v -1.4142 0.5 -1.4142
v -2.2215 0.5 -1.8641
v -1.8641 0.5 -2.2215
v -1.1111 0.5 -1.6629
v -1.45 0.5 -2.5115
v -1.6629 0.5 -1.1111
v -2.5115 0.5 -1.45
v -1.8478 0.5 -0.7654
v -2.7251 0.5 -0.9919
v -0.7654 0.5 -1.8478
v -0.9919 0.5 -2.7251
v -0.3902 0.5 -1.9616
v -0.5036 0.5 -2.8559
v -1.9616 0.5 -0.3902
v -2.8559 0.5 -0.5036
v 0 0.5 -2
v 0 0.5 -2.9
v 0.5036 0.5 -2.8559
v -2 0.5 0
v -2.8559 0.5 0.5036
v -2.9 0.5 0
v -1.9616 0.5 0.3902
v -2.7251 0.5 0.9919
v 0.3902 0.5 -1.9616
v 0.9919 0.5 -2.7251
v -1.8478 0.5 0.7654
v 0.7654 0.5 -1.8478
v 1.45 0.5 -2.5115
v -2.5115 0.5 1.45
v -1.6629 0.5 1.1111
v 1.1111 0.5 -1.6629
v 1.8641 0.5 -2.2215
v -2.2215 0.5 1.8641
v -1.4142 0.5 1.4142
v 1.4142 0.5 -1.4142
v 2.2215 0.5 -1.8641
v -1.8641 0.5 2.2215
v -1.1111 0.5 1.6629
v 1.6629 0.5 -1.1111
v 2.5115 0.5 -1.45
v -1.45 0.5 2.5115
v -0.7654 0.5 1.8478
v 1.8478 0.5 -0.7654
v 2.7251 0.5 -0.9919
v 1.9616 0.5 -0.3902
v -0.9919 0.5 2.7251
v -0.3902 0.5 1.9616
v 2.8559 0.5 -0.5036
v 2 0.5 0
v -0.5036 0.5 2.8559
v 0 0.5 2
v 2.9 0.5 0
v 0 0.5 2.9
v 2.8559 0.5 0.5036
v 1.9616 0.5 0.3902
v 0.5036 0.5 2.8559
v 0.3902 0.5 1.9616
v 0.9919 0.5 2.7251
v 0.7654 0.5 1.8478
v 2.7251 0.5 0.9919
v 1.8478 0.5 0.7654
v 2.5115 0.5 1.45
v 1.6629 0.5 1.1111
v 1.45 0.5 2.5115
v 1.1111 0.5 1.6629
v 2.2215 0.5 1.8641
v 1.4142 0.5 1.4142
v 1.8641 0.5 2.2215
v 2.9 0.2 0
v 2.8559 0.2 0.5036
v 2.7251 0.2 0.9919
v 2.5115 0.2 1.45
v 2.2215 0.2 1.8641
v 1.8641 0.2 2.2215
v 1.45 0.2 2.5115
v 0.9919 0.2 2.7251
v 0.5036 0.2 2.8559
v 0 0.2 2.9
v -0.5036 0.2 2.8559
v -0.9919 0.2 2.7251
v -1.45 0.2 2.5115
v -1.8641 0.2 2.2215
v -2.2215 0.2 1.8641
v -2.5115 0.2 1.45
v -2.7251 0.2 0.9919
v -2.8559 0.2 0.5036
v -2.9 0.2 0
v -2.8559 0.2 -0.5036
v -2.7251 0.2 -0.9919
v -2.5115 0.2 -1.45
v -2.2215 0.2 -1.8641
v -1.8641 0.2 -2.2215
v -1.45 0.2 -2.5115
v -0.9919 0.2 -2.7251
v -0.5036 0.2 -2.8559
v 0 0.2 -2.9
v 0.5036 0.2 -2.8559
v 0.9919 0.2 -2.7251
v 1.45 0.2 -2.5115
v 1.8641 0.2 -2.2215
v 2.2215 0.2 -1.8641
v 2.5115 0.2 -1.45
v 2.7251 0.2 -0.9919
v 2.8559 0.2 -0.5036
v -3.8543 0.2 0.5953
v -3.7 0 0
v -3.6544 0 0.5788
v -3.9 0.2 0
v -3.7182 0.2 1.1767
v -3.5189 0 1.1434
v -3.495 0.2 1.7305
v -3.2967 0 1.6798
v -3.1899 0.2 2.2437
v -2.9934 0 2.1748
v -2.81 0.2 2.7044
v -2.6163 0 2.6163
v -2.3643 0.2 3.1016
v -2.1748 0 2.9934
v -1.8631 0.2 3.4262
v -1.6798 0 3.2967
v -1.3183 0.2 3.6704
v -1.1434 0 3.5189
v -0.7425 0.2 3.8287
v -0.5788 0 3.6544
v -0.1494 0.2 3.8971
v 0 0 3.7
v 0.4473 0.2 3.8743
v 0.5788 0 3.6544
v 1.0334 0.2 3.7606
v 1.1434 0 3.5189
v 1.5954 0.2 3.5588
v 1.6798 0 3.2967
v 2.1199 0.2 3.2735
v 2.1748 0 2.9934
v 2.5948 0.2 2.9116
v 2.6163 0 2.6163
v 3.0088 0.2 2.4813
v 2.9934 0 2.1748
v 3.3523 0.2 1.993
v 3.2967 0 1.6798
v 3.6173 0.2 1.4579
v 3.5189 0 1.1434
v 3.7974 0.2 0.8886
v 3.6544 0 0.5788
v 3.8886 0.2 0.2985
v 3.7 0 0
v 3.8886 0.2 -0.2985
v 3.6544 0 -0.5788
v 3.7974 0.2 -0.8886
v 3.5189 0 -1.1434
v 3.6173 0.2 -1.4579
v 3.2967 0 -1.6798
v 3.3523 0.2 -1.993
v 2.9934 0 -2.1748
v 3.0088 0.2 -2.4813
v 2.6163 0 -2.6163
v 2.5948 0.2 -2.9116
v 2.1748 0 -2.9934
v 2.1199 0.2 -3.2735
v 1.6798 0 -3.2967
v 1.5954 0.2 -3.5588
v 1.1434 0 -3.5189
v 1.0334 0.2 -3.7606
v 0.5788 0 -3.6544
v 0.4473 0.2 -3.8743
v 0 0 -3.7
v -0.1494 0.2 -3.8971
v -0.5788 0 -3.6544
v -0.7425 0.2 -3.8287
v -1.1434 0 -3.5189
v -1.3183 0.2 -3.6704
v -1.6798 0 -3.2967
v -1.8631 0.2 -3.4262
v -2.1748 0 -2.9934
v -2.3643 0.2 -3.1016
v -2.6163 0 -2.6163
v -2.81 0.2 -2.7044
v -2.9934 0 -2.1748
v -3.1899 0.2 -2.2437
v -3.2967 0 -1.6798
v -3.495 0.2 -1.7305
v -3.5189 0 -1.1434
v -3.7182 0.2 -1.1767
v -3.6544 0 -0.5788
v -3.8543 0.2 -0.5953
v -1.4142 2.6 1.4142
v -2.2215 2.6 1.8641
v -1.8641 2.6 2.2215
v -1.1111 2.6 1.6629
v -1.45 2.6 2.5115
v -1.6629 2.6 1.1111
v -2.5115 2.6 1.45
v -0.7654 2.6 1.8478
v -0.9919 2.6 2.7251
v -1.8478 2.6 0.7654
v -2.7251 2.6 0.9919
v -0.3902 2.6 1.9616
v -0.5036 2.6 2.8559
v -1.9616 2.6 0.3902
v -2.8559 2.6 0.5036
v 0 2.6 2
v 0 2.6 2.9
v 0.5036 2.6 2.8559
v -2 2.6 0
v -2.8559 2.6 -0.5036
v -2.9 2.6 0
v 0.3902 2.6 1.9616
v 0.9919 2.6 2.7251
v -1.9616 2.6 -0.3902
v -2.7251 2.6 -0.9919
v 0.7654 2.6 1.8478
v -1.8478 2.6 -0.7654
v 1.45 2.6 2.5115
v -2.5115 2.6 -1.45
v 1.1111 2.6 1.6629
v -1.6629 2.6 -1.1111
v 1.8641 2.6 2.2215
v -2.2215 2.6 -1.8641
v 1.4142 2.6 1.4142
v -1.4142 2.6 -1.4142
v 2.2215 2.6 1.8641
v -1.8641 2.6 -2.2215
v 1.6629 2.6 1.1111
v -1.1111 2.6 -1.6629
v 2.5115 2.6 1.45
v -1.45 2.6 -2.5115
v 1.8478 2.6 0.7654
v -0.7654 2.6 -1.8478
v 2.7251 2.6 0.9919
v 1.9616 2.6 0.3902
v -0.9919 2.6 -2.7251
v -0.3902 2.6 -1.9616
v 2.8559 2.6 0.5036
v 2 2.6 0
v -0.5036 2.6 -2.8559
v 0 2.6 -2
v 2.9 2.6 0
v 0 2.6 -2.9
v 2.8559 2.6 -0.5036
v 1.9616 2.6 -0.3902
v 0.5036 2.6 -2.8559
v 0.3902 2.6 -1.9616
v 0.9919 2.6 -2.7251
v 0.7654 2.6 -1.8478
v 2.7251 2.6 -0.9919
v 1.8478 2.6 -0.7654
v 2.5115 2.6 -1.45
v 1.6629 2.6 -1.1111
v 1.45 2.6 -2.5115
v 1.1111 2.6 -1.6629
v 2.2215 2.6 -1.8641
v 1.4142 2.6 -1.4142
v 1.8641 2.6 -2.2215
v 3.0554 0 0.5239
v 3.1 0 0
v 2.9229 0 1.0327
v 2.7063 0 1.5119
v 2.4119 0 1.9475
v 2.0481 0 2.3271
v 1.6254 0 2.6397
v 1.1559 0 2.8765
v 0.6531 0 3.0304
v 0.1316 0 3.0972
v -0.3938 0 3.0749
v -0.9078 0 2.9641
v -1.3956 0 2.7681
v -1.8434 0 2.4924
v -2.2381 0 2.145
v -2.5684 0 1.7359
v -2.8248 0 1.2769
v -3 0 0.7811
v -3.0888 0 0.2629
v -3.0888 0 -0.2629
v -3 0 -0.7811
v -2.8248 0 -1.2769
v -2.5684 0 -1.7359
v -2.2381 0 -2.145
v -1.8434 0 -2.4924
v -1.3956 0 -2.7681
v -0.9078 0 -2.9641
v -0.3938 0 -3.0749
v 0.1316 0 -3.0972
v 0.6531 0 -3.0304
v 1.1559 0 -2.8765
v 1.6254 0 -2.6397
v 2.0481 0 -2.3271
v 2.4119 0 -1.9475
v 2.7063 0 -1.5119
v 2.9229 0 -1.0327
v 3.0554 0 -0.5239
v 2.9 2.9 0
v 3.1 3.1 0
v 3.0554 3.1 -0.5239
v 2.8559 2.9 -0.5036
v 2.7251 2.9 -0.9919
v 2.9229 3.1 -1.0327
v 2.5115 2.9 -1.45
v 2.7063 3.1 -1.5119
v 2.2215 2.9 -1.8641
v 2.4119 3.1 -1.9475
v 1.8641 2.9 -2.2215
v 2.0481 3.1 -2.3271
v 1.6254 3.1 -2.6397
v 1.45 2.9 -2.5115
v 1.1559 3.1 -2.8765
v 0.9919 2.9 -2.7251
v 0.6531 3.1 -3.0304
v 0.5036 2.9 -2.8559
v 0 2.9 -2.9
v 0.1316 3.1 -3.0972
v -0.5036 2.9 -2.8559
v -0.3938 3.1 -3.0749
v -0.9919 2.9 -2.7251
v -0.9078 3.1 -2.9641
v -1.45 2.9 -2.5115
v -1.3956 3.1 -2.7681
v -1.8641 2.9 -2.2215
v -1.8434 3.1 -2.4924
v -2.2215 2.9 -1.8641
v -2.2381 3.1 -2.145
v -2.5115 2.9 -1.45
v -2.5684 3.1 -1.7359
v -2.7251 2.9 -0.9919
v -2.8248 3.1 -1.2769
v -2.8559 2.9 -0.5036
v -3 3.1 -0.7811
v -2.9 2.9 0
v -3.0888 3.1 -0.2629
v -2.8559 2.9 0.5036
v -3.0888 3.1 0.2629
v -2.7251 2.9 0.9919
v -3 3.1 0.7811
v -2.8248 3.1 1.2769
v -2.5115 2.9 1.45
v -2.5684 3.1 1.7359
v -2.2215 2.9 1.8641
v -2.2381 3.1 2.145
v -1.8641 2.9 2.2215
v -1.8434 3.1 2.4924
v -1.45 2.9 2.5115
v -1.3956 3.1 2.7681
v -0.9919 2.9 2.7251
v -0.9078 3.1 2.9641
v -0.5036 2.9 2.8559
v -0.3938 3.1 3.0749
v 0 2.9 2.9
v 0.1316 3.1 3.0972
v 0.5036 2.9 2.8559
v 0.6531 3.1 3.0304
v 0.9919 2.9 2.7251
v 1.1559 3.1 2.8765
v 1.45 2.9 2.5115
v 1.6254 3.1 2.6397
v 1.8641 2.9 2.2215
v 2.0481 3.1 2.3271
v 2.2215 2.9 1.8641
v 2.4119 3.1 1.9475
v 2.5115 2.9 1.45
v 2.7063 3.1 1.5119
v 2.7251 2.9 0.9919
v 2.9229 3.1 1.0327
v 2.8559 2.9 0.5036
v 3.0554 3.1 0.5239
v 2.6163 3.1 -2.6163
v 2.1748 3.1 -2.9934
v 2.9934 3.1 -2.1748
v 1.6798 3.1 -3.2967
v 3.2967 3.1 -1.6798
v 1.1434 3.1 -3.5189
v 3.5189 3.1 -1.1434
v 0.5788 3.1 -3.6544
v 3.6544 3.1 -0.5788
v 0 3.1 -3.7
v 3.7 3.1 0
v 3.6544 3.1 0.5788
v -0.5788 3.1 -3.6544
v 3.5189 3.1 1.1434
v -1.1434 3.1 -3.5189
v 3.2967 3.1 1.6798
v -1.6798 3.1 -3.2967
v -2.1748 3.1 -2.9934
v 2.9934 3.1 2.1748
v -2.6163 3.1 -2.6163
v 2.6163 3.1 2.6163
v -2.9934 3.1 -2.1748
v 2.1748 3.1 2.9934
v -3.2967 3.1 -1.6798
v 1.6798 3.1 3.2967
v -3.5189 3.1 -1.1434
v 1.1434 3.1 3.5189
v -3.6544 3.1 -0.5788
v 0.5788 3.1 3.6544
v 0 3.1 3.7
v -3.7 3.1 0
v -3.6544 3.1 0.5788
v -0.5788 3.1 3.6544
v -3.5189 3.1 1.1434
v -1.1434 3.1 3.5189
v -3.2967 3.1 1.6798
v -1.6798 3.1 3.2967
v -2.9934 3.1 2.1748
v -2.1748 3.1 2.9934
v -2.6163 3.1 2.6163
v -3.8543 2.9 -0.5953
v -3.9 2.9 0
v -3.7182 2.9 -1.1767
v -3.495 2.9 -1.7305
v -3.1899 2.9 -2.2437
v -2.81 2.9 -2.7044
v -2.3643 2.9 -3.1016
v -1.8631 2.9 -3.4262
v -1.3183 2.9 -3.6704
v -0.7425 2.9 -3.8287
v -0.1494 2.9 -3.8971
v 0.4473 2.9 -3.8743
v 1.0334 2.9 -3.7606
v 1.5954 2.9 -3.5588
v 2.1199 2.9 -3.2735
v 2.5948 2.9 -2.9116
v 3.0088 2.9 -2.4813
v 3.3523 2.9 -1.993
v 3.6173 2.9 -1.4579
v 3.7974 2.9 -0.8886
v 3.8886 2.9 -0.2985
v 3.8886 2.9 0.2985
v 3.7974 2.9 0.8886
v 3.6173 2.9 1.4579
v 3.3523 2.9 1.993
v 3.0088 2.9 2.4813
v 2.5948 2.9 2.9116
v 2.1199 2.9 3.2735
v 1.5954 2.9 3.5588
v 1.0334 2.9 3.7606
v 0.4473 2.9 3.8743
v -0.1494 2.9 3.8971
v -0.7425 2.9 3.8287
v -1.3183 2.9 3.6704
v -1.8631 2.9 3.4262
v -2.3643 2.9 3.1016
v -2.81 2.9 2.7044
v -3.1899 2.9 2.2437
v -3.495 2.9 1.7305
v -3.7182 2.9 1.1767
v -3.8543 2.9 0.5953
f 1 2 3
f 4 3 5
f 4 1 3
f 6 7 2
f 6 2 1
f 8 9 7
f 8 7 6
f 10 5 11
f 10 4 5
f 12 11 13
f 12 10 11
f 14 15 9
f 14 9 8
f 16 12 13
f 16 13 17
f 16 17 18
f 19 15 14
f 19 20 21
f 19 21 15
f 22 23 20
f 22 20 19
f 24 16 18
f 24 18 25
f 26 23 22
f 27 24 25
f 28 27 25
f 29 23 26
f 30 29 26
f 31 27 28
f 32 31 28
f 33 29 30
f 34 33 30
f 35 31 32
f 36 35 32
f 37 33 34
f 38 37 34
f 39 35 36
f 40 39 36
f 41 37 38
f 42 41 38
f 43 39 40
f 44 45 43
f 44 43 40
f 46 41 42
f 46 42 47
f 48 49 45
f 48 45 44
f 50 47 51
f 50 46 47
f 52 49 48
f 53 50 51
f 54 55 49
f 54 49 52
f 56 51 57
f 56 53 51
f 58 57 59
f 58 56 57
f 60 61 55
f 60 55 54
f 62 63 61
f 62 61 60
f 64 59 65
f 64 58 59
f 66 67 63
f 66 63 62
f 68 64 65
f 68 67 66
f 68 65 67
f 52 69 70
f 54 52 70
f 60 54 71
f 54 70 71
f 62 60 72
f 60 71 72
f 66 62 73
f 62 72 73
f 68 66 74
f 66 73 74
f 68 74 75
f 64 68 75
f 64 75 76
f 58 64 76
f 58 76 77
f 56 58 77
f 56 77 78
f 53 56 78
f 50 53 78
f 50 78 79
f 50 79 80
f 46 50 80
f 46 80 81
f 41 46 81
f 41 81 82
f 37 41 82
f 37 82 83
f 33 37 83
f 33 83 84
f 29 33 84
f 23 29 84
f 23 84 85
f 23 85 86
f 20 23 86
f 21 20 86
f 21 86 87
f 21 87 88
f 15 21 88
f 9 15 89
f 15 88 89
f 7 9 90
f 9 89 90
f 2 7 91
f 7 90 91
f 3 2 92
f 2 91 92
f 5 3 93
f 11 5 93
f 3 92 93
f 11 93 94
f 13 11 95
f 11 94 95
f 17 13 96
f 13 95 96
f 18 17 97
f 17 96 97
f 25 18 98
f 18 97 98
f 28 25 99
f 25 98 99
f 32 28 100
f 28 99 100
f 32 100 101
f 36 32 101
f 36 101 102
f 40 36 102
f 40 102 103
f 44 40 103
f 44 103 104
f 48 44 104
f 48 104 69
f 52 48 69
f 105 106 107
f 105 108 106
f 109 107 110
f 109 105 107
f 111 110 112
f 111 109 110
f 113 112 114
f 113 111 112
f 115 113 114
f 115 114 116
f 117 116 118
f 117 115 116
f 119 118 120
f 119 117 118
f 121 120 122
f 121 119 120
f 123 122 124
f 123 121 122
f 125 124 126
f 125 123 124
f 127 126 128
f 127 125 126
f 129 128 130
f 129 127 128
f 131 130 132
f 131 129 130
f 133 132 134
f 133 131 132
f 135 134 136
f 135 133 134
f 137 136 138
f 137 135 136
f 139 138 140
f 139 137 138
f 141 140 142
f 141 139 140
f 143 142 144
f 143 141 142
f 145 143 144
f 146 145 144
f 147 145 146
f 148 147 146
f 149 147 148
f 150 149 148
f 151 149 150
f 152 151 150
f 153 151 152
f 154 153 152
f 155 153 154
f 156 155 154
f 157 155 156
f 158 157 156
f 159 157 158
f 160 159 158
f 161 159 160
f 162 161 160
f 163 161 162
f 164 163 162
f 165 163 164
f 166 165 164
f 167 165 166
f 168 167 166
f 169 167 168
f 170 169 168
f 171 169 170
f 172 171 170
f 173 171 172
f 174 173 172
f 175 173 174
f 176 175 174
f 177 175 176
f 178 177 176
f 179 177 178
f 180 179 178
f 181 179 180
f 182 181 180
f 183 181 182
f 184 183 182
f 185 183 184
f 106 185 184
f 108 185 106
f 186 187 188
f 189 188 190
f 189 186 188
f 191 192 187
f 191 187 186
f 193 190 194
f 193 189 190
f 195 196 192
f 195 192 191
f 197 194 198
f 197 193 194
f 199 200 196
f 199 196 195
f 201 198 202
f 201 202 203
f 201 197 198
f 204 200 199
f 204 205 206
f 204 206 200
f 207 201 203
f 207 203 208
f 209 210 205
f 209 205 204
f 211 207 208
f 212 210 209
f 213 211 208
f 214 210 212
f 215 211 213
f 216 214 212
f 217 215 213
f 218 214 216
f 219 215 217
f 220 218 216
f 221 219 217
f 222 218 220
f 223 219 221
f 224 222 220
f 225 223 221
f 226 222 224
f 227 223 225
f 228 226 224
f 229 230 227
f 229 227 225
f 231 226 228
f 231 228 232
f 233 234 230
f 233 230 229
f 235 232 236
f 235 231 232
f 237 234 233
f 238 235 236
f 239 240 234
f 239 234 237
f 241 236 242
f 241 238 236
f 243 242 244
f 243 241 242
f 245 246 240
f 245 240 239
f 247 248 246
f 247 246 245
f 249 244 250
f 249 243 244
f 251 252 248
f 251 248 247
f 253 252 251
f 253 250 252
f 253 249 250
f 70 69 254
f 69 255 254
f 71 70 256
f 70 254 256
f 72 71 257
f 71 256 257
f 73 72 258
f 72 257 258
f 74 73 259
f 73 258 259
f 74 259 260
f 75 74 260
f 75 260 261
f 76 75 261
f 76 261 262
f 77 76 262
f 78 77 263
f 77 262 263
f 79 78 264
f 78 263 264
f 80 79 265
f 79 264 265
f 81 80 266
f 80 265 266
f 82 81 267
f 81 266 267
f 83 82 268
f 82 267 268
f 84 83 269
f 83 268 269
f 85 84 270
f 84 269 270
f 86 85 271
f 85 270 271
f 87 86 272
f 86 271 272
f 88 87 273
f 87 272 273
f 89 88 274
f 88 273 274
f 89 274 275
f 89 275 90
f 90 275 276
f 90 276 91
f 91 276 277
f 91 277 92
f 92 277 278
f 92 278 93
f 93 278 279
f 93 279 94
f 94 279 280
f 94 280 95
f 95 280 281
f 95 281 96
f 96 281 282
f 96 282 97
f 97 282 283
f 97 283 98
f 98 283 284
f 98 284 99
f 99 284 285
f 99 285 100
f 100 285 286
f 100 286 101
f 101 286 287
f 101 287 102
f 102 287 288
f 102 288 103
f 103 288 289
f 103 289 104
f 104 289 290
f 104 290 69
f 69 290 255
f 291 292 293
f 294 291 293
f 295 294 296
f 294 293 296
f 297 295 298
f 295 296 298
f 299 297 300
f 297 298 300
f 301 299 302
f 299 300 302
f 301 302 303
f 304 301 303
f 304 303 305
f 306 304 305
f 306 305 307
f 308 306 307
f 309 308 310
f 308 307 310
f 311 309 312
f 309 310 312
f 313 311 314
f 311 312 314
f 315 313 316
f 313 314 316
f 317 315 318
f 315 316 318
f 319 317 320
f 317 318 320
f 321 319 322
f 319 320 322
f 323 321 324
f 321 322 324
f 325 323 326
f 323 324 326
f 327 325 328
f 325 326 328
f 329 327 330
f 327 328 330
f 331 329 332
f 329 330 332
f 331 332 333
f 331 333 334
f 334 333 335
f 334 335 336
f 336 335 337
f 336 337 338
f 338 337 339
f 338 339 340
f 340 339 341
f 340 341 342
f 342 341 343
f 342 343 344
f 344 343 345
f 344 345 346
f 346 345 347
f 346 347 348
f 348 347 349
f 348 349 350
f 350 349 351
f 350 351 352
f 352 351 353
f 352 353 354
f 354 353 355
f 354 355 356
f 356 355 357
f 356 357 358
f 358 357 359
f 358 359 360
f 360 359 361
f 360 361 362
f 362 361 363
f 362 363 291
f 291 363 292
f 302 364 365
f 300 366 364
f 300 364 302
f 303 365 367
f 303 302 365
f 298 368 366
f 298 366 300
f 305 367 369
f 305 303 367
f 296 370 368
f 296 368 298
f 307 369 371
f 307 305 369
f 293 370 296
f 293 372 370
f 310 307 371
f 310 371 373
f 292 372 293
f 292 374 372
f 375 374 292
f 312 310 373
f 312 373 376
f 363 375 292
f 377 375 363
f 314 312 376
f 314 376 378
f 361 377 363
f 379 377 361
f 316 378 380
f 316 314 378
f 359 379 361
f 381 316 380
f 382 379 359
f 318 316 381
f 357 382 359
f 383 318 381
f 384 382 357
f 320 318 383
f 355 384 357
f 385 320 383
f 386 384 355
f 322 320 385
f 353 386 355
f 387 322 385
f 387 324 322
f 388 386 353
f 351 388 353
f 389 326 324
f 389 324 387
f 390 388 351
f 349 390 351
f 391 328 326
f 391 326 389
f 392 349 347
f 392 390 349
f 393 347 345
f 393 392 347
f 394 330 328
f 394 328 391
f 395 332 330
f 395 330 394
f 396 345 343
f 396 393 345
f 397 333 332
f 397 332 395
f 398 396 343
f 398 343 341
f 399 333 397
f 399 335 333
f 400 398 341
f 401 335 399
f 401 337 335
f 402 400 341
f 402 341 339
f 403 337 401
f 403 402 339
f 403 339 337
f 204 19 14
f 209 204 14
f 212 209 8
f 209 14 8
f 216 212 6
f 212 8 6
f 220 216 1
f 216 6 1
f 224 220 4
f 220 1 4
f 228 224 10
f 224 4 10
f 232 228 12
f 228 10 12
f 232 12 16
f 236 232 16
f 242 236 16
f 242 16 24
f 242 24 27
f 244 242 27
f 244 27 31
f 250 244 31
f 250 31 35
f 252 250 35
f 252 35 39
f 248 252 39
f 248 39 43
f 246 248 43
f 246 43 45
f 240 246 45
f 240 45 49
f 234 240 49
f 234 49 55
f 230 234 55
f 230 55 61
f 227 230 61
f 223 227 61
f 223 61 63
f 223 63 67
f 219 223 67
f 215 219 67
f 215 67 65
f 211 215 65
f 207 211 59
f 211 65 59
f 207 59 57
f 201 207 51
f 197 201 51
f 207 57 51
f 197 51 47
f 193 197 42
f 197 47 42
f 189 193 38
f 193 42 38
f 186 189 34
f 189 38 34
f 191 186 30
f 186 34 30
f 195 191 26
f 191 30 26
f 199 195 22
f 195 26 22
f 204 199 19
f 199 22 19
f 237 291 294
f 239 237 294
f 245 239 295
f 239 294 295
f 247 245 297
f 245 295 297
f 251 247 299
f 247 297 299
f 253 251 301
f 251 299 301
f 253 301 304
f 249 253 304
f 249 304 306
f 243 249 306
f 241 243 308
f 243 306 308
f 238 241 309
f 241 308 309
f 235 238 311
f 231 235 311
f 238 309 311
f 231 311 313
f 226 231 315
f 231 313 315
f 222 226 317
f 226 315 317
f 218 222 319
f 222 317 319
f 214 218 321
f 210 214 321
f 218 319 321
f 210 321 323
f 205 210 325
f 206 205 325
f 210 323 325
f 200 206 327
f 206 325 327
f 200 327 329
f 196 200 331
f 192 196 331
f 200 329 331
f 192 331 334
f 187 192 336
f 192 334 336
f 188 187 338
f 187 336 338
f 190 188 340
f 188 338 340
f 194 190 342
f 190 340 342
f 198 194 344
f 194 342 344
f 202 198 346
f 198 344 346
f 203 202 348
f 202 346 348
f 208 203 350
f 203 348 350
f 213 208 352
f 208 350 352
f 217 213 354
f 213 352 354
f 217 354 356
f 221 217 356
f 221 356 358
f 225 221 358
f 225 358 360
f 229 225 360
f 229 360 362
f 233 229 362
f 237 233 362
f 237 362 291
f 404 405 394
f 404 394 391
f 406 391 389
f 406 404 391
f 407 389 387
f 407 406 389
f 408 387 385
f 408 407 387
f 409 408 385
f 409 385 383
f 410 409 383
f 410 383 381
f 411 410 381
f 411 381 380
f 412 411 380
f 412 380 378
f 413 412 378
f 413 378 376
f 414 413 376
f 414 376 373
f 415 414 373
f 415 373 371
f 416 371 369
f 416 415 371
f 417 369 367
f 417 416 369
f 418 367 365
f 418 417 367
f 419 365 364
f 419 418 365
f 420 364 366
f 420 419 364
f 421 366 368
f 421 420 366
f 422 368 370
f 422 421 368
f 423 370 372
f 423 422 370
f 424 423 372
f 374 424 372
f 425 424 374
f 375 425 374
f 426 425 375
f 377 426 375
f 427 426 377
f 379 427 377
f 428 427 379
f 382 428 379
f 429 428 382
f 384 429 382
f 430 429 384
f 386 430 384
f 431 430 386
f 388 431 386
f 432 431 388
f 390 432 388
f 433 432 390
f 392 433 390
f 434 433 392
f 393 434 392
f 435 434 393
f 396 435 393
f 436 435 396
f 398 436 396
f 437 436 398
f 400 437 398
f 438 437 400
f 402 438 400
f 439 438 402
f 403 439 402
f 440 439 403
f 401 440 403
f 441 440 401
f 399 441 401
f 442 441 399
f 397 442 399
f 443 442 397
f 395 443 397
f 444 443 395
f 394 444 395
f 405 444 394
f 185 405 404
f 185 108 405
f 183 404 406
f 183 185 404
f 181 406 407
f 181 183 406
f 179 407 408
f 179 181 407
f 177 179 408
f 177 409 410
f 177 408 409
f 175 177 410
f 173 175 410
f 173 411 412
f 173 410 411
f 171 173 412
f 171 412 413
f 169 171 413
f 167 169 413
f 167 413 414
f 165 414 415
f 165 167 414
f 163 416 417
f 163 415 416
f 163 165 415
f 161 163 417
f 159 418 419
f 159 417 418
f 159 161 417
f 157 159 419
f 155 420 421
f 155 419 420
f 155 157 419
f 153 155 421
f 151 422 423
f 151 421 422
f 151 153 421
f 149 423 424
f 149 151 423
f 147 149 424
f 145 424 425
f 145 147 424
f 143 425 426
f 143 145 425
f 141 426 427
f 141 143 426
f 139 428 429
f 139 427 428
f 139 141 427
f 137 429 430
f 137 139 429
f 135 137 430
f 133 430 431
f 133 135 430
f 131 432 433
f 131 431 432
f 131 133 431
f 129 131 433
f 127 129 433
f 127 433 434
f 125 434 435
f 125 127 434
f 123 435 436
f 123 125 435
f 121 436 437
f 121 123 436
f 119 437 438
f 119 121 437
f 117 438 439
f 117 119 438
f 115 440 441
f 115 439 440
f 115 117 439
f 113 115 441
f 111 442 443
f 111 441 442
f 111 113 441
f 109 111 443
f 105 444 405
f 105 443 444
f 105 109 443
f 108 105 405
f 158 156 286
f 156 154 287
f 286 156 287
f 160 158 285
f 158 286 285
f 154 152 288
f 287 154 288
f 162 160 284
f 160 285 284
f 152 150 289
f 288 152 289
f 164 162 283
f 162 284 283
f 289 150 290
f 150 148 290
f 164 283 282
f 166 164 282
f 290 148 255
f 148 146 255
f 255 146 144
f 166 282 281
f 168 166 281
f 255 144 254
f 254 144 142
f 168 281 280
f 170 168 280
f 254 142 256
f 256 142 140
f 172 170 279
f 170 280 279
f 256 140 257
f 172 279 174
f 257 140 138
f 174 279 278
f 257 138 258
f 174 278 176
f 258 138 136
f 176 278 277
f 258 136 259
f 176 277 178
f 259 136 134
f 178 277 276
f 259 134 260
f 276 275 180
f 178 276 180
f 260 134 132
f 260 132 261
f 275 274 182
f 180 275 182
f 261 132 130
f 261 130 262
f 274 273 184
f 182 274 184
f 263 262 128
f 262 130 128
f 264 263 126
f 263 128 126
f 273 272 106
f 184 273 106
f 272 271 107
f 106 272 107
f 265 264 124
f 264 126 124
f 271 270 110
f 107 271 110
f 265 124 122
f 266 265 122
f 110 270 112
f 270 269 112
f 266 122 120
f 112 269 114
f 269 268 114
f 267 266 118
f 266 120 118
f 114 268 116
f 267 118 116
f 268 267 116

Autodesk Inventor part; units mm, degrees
ref_plane "YZ Plane" through (0, 0, 0) normal (1, 0, 0) x (0, 1, 0)
ref_plane "XZ Plane" through (0, 0, 0) normal (0, 1, 0) x (-1, 0, 0)
ref_plane "XY Plane" through (0, 0, 0) normal (0, 0, 1) x (1, 0, 0)
sketch "Эскиз1" plane through (0, 0, 0) normal (0, 1, 0) x (-1, 0, 0)
  circle A0 centre (0, 0) radius 3.9
  circle A1 centre (0, 0) radius 2
  dimension "d0" = 7.8
  dimension "d1" = 4
extrude "Выдавливание1" add sketch "Эскиз1" along normal blind 3.1
sketch "Эскиз2" plane through (0, 3.1, 0) normal (0, 1, 0) x (1, 0, 0)
  circle A0 centre (0, 0) radius 3
  circle A1 centre (0, 0) radius 2.9
  circle A2 centre (0, 0) radius 3.9 projected
  circle A3 centre (0, 0) radius 2 projected
  dimension "d4" = 1
  dimension "d5" = 1
extrude "Выдавливание2" cut sketch "Эскиз2" against normal blind 0.5 contours A1 | A3
sketch "Эскиз3" plane through (0, 0, 0) normal (0, -1, 0) x (1, 0, 0)
  circle A0 centre (0, 0) radius 2.9 projected
  circle A1 centre (0, 0) radius 3
  circle A2 centre (0, 0) radius 2.9
  circle A3 centre (0, 0) radius 3.9
  circle A4 centre (0, 0) radius 2
  dimension "d13" = 1
  dimension "d14" = 1
extrude "Выдавливание3" cut sketch "Эскиз3" against normal blind 0.5 contours A0 | A4
chamfer "Фаска1" distance 0.2 angle 45 4 edges at (-2.9, 0, 0) (3.9, 0, 0) (3.9, 3.1, 0) (-2.9, 3.1, 0)
properties part number "Подшипник 626Z" material "Титан"
